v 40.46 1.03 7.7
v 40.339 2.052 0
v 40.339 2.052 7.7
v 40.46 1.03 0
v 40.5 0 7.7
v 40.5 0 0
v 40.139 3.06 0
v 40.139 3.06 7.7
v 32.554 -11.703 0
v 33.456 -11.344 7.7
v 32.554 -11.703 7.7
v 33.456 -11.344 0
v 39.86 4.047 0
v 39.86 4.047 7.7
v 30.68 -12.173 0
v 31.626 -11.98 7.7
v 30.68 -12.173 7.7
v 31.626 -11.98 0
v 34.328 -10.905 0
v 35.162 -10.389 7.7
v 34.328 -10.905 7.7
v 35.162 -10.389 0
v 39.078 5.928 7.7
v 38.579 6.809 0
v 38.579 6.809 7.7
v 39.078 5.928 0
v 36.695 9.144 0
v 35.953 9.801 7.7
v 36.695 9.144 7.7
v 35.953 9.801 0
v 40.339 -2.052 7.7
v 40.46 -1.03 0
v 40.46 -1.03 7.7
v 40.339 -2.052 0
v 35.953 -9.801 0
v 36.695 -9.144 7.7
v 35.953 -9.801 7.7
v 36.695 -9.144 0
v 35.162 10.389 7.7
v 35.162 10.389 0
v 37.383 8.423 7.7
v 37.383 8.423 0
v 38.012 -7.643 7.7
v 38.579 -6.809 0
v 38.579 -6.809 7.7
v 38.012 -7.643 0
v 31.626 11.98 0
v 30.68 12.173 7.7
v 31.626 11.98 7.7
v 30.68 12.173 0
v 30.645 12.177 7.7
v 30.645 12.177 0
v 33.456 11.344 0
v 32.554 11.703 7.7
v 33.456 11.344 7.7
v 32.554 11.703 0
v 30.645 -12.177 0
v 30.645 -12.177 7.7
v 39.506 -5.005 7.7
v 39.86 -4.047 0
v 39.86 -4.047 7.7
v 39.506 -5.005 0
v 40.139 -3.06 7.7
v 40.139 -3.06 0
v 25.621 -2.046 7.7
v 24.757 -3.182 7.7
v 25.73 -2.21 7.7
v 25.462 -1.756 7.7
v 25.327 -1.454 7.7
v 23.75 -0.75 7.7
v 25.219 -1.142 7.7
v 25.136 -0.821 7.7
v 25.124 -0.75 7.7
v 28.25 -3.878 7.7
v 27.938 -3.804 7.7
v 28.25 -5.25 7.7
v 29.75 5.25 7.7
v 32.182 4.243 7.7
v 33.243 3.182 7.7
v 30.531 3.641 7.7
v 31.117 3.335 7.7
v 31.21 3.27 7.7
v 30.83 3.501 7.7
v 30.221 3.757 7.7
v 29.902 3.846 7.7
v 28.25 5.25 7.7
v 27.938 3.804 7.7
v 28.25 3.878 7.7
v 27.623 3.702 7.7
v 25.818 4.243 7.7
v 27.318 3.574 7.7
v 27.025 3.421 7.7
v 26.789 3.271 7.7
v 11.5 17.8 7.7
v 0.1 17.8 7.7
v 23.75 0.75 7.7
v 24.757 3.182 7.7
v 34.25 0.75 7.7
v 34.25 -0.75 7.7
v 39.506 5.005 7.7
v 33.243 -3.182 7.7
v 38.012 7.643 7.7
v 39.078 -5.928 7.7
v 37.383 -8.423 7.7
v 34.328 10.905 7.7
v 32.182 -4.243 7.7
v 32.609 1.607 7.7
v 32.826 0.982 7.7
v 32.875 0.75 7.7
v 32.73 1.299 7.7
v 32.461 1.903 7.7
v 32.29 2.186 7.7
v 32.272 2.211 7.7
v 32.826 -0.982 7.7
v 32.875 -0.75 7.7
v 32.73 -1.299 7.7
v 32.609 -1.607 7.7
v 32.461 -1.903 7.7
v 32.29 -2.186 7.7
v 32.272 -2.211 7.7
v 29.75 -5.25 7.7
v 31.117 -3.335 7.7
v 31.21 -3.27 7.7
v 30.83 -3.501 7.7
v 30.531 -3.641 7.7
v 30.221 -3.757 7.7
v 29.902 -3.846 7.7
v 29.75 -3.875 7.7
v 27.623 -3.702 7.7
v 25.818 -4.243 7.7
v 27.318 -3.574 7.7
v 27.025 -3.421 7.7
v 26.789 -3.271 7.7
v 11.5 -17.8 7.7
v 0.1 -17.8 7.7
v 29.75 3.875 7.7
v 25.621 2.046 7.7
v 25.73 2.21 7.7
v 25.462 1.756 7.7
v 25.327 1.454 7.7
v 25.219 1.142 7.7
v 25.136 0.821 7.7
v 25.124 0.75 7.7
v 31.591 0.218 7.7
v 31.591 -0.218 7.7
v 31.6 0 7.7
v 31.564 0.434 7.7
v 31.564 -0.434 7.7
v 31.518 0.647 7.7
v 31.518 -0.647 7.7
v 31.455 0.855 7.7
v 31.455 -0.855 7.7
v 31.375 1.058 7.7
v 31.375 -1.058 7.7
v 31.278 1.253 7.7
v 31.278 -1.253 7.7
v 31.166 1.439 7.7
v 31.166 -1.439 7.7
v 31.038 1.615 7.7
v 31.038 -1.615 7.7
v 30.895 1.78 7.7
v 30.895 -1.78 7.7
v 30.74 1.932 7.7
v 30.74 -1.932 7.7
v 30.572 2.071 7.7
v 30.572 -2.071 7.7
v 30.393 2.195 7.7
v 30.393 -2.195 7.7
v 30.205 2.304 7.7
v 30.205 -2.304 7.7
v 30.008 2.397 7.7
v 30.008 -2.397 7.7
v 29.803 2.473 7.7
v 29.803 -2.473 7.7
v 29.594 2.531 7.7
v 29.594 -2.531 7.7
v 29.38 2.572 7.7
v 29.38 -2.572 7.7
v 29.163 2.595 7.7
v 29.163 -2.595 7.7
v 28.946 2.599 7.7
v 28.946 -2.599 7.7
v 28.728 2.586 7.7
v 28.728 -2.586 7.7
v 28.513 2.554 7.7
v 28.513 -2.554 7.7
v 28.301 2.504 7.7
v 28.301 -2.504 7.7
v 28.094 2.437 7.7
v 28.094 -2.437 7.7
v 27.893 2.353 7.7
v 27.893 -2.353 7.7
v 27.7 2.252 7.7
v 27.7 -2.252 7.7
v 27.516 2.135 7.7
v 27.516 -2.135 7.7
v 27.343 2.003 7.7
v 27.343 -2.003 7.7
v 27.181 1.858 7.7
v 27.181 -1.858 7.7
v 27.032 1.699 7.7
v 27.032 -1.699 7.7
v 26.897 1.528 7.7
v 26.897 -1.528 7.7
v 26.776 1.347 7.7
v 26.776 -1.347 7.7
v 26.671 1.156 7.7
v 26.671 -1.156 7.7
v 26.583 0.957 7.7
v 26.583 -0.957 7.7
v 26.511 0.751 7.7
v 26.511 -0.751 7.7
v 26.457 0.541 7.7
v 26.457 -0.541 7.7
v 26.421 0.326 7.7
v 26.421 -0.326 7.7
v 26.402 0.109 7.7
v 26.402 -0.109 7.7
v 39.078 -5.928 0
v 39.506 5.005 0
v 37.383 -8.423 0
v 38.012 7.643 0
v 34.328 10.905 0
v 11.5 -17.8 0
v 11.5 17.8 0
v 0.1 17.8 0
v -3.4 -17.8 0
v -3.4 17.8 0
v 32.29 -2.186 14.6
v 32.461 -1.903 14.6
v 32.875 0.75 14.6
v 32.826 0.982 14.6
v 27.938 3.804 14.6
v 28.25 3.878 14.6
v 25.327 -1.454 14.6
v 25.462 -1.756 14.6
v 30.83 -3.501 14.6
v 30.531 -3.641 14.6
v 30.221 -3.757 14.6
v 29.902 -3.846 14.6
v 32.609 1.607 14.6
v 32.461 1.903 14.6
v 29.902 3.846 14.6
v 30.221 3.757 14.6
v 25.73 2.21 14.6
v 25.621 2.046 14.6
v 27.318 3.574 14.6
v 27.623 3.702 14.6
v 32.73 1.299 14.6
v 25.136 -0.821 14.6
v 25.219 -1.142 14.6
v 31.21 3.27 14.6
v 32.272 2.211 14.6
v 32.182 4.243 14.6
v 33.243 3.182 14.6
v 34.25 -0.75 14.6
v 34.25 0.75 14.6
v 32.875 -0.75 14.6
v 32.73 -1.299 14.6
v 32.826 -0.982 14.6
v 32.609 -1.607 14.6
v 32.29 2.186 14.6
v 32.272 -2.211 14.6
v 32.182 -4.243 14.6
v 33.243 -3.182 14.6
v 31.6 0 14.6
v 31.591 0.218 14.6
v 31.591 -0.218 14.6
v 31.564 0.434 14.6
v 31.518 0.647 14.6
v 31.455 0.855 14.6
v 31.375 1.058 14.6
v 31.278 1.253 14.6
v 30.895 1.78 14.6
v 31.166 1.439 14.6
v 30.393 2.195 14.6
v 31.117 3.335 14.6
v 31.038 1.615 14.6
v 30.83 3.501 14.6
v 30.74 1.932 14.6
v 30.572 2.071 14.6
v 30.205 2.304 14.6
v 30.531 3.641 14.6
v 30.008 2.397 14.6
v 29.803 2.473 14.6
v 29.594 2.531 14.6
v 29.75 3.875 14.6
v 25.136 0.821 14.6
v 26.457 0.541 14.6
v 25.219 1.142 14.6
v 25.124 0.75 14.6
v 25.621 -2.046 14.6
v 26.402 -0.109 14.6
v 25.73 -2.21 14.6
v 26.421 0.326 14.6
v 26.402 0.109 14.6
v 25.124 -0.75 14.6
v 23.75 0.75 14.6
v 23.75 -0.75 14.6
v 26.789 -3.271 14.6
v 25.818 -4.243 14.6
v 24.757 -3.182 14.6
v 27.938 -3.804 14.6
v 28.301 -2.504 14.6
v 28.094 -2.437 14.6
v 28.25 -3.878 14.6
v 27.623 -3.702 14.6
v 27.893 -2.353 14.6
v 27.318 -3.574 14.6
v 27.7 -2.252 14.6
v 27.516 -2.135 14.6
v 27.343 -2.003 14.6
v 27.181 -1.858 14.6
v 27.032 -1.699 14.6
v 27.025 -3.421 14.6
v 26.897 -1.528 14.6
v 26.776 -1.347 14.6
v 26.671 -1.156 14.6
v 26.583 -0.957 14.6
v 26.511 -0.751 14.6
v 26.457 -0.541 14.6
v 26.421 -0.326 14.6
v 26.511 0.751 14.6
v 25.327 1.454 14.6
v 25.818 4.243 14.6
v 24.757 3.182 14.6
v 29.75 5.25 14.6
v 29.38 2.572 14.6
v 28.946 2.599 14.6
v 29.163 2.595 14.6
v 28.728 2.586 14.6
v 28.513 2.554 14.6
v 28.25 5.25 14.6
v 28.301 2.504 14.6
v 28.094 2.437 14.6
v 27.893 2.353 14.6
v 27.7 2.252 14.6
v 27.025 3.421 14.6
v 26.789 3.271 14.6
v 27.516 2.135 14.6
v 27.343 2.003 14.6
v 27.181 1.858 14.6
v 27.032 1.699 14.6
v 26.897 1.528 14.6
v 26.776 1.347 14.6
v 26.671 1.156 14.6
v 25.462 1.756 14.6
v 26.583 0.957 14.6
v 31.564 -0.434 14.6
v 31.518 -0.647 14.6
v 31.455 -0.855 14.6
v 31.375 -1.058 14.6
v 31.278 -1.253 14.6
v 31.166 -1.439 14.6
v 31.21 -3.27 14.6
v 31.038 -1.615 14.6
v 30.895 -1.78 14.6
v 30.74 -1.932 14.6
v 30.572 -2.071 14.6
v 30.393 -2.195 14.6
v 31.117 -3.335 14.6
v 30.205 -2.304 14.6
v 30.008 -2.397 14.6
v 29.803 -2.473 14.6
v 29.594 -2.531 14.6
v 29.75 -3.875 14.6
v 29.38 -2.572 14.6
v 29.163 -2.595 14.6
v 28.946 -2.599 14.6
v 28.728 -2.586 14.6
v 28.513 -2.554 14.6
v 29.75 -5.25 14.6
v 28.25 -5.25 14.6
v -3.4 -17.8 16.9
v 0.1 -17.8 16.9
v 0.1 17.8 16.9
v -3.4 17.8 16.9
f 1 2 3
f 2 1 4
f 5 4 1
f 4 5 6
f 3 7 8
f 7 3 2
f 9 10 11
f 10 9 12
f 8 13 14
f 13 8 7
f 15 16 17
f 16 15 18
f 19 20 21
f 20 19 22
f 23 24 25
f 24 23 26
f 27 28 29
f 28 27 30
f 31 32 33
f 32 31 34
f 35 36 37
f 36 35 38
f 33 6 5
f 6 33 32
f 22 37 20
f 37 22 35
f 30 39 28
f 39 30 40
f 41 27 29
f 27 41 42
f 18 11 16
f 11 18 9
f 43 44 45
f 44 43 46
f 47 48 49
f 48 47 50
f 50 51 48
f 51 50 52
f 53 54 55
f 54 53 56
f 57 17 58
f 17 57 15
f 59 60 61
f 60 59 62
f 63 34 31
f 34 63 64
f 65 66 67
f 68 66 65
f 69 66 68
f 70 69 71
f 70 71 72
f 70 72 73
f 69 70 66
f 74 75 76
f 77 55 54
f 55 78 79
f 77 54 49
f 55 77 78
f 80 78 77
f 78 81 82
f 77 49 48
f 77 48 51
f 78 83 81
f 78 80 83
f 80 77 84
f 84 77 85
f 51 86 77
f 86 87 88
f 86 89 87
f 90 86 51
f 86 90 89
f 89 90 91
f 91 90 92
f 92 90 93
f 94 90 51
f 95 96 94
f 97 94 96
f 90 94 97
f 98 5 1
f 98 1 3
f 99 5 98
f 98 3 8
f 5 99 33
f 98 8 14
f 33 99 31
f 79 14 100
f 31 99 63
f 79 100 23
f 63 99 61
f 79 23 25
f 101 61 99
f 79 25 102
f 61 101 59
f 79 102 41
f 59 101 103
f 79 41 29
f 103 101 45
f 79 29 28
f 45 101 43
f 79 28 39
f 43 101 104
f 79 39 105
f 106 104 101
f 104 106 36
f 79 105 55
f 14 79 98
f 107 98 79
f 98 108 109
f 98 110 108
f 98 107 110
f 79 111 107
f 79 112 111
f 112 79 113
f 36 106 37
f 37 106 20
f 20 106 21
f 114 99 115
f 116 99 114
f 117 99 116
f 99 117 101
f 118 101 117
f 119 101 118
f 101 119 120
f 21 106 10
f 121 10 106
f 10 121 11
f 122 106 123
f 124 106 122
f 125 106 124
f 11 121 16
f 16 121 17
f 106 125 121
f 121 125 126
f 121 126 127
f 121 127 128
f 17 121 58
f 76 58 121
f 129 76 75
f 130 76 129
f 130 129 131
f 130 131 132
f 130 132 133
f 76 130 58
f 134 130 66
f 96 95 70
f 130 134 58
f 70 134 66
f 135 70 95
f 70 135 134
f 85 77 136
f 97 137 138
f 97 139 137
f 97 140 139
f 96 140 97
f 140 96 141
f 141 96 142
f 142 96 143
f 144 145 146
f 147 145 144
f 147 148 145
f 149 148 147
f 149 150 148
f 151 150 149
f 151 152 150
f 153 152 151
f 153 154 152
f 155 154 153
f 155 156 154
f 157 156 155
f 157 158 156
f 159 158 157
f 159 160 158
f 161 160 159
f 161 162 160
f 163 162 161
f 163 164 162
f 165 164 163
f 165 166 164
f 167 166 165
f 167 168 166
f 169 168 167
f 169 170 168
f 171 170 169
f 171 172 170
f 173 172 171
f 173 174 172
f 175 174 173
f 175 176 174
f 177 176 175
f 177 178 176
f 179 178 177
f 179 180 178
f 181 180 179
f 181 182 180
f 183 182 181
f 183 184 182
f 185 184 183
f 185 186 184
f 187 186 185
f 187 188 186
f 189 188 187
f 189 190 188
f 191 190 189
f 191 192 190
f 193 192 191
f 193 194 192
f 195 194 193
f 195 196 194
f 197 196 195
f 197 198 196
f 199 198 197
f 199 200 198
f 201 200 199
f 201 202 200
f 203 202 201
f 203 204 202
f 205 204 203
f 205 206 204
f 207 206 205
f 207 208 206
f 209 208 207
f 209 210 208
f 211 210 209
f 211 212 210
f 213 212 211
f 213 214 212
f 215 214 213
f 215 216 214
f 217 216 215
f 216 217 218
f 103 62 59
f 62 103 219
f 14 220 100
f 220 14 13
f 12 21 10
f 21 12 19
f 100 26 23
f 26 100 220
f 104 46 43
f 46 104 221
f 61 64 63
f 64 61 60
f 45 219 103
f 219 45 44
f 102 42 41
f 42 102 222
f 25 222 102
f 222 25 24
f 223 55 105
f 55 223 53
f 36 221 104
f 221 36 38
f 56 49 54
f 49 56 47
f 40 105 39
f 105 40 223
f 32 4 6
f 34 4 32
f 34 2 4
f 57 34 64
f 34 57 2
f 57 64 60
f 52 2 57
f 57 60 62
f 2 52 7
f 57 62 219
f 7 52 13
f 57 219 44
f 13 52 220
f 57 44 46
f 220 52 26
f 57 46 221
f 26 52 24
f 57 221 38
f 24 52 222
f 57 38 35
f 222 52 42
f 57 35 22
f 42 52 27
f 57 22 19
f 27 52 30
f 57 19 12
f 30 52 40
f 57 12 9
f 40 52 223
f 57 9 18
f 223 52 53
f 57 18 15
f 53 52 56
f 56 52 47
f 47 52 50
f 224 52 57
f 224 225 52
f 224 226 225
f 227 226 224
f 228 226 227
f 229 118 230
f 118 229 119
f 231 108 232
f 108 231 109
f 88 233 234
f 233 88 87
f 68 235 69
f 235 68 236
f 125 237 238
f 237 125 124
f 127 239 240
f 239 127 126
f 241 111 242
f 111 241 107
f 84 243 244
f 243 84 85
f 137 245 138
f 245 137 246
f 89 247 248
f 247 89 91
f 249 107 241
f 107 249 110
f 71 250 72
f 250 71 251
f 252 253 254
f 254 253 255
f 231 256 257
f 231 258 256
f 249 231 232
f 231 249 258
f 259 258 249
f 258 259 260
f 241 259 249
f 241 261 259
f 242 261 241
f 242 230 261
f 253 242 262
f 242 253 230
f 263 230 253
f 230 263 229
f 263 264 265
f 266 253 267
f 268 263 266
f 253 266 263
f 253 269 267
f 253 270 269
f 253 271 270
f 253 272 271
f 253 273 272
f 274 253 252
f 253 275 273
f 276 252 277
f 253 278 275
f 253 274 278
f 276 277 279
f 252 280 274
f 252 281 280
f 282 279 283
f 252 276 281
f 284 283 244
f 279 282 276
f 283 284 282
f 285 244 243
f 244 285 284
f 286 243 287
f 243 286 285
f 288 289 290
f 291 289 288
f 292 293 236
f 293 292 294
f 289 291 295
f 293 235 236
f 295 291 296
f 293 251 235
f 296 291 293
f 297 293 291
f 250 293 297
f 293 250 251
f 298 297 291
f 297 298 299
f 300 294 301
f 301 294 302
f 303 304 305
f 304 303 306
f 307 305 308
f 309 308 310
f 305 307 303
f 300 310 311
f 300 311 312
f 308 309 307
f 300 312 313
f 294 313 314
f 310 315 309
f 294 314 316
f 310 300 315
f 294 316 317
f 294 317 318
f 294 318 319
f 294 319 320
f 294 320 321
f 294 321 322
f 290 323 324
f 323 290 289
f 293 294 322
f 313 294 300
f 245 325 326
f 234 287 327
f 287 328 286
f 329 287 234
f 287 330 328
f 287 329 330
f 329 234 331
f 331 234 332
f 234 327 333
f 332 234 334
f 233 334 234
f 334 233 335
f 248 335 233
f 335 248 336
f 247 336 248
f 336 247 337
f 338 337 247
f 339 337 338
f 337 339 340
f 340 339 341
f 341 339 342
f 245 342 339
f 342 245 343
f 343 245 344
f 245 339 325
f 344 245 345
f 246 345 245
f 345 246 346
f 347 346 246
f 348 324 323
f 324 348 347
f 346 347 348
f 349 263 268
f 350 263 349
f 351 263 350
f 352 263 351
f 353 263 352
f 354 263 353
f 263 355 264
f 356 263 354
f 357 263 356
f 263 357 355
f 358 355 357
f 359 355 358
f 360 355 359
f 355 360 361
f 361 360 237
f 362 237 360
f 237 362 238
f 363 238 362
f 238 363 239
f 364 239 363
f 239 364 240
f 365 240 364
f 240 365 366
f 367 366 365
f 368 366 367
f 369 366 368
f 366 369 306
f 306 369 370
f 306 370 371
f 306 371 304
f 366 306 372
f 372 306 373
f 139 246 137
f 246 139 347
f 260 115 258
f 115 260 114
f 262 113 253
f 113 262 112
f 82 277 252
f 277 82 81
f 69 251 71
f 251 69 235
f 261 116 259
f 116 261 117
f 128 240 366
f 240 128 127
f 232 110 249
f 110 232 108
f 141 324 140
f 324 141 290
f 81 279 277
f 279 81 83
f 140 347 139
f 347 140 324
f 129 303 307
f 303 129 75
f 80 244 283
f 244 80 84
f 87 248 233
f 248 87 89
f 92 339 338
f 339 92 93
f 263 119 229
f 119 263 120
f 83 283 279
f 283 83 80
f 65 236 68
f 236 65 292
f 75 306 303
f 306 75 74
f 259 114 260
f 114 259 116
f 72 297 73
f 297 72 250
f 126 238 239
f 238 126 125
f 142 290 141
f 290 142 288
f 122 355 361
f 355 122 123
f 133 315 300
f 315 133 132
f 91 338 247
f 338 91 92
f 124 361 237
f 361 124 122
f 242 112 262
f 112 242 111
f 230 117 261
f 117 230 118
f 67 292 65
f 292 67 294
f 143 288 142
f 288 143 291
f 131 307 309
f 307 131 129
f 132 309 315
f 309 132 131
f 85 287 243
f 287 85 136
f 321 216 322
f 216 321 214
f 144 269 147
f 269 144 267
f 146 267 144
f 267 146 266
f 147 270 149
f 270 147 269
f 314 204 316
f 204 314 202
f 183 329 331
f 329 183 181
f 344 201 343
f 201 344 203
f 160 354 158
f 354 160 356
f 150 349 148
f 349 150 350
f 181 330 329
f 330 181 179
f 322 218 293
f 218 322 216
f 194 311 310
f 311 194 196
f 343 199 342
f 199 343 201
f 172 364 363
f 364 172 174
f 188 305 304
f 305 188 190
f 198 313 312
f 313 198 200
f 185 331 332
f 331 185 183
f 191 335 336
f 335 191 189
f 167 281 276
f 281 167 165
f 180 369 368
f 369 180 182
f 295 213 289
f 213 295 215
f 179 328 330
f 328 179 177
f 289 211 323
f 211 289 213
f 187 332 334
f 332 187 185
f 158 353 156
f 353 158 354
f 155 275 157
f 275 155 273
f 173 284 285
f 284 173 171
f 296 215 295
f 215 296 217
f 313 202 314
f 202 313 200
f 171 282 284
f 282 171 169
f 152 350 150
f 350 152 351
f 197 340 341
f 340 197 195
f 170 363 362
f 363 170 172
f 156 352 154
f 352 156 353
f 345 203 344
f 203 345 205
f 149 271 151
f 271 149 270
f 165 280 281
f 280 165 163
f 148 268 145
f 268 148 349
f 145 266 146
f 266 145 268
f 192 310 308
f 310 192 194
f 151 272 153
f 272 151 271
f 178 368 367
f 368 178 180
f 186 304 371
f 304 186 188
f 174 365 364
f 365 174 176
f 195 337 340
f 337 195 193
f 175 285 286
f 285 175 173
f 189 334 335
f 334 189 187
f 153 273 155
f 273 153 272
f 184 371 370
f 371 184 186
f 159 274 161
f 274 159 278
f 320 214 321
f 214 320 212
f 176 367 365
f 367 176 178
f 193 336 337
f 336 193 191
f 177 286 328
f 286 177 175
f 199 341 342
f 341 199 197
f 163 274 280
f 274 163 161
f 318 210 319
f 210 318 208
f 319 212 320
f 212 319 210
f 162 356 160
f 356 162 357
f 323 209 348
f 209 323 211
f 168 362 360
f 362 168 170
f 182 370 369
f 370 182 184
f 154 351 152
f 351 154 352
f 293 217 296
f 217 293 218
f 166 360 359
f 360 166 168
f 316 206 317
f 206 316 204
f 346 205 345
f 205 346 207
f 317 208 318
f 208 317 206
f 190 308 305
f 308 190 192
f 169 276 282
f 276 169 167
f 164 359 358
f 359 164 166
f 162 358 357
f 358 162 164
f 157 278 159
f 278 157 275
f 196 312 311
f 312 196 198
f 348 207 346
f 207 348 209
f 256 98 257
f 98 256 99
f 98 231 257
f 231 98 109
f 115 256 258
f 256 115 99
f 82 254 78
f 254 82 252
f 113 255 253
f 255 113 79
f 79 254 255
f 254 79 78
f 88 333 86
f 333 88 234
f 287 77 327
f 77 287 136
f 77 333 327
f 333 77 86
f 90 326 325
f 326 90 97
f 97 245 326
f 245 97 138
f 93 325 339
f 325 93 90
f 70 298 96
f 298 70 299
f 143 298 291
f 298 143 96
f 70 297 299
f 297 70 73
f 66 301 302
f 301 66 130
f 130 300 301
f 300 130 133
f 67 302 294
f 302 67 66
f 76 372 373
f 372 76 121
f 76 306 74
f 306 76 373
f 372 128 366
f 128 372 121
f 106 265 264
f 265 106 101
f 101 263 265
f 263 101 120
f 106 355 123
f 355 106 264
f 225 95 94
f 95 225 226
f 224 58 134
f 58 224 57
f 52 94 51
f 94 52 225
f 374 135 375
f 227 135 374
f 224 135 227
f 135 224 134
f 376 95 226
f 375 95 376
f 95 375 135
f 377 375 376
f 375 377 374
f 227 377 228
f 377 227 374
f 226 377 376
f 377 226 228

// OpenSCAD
// created by IndiePandaaaaa
// encoding: utf-8
$fn = 75;

outer_height = 35.6;
outer_radius = 11.5;
outer_axis_offset = 17.5;
axis_od = 7.9;
axis_id = 5.2;
axis_cubes = 1.5;
axis_depth = 7;
base_thickness = 3.4;
base_depth = 16.9;
thickness = 7.7;

union() {
  translate([outer_axis_offset + outer_radius, 0, 0]) difference() {
    scale([1, 1.07, 1]) cylinder(r = outer_radius, h = thickness);
    translate([-outer_height, -outer_height / 2, -.1])
      cube(outer_height + .1);
  }
  translate([0, -outer_height / 2, 0]) linear_extrude(thickness) {
    triangle = (outer_height - outer_radius * 2) / 2;
    polygon([
        [0, 0],
        [outer_radius, 0],
        [outer_radius + outer_axis_offset + axis_od / 2, triangle],
        [outer_radius + outer_axis_offset + axis_od / 2, outer_height - triangle],
        [outer_radius, outer_height],
        [0, outer_height],
      ]);
  }
  translate([-base_thickness, -outer_height / 2, 0])
    cube([base_thickness + .1, outer_height, base_depth]);
  translate([outer_radius + outer_axis_offset, 0, thickness - .1]) union() {
    difference() {
      cylinder(d = axis_od, h = axis_depth);
      translate([0, 0, -.1]) cylinder(d = axis_id, h = axis_depth + .2);
    }
    for (i = [0:8 - 1]) {
      rotate([0, 0, 45 * i])
        translate([axis_od / 2 - .2, -axis_cubes / 2, 0])
          cube([axis_cubes, axis_cubes, axis_depth]);
    }
  }
}
